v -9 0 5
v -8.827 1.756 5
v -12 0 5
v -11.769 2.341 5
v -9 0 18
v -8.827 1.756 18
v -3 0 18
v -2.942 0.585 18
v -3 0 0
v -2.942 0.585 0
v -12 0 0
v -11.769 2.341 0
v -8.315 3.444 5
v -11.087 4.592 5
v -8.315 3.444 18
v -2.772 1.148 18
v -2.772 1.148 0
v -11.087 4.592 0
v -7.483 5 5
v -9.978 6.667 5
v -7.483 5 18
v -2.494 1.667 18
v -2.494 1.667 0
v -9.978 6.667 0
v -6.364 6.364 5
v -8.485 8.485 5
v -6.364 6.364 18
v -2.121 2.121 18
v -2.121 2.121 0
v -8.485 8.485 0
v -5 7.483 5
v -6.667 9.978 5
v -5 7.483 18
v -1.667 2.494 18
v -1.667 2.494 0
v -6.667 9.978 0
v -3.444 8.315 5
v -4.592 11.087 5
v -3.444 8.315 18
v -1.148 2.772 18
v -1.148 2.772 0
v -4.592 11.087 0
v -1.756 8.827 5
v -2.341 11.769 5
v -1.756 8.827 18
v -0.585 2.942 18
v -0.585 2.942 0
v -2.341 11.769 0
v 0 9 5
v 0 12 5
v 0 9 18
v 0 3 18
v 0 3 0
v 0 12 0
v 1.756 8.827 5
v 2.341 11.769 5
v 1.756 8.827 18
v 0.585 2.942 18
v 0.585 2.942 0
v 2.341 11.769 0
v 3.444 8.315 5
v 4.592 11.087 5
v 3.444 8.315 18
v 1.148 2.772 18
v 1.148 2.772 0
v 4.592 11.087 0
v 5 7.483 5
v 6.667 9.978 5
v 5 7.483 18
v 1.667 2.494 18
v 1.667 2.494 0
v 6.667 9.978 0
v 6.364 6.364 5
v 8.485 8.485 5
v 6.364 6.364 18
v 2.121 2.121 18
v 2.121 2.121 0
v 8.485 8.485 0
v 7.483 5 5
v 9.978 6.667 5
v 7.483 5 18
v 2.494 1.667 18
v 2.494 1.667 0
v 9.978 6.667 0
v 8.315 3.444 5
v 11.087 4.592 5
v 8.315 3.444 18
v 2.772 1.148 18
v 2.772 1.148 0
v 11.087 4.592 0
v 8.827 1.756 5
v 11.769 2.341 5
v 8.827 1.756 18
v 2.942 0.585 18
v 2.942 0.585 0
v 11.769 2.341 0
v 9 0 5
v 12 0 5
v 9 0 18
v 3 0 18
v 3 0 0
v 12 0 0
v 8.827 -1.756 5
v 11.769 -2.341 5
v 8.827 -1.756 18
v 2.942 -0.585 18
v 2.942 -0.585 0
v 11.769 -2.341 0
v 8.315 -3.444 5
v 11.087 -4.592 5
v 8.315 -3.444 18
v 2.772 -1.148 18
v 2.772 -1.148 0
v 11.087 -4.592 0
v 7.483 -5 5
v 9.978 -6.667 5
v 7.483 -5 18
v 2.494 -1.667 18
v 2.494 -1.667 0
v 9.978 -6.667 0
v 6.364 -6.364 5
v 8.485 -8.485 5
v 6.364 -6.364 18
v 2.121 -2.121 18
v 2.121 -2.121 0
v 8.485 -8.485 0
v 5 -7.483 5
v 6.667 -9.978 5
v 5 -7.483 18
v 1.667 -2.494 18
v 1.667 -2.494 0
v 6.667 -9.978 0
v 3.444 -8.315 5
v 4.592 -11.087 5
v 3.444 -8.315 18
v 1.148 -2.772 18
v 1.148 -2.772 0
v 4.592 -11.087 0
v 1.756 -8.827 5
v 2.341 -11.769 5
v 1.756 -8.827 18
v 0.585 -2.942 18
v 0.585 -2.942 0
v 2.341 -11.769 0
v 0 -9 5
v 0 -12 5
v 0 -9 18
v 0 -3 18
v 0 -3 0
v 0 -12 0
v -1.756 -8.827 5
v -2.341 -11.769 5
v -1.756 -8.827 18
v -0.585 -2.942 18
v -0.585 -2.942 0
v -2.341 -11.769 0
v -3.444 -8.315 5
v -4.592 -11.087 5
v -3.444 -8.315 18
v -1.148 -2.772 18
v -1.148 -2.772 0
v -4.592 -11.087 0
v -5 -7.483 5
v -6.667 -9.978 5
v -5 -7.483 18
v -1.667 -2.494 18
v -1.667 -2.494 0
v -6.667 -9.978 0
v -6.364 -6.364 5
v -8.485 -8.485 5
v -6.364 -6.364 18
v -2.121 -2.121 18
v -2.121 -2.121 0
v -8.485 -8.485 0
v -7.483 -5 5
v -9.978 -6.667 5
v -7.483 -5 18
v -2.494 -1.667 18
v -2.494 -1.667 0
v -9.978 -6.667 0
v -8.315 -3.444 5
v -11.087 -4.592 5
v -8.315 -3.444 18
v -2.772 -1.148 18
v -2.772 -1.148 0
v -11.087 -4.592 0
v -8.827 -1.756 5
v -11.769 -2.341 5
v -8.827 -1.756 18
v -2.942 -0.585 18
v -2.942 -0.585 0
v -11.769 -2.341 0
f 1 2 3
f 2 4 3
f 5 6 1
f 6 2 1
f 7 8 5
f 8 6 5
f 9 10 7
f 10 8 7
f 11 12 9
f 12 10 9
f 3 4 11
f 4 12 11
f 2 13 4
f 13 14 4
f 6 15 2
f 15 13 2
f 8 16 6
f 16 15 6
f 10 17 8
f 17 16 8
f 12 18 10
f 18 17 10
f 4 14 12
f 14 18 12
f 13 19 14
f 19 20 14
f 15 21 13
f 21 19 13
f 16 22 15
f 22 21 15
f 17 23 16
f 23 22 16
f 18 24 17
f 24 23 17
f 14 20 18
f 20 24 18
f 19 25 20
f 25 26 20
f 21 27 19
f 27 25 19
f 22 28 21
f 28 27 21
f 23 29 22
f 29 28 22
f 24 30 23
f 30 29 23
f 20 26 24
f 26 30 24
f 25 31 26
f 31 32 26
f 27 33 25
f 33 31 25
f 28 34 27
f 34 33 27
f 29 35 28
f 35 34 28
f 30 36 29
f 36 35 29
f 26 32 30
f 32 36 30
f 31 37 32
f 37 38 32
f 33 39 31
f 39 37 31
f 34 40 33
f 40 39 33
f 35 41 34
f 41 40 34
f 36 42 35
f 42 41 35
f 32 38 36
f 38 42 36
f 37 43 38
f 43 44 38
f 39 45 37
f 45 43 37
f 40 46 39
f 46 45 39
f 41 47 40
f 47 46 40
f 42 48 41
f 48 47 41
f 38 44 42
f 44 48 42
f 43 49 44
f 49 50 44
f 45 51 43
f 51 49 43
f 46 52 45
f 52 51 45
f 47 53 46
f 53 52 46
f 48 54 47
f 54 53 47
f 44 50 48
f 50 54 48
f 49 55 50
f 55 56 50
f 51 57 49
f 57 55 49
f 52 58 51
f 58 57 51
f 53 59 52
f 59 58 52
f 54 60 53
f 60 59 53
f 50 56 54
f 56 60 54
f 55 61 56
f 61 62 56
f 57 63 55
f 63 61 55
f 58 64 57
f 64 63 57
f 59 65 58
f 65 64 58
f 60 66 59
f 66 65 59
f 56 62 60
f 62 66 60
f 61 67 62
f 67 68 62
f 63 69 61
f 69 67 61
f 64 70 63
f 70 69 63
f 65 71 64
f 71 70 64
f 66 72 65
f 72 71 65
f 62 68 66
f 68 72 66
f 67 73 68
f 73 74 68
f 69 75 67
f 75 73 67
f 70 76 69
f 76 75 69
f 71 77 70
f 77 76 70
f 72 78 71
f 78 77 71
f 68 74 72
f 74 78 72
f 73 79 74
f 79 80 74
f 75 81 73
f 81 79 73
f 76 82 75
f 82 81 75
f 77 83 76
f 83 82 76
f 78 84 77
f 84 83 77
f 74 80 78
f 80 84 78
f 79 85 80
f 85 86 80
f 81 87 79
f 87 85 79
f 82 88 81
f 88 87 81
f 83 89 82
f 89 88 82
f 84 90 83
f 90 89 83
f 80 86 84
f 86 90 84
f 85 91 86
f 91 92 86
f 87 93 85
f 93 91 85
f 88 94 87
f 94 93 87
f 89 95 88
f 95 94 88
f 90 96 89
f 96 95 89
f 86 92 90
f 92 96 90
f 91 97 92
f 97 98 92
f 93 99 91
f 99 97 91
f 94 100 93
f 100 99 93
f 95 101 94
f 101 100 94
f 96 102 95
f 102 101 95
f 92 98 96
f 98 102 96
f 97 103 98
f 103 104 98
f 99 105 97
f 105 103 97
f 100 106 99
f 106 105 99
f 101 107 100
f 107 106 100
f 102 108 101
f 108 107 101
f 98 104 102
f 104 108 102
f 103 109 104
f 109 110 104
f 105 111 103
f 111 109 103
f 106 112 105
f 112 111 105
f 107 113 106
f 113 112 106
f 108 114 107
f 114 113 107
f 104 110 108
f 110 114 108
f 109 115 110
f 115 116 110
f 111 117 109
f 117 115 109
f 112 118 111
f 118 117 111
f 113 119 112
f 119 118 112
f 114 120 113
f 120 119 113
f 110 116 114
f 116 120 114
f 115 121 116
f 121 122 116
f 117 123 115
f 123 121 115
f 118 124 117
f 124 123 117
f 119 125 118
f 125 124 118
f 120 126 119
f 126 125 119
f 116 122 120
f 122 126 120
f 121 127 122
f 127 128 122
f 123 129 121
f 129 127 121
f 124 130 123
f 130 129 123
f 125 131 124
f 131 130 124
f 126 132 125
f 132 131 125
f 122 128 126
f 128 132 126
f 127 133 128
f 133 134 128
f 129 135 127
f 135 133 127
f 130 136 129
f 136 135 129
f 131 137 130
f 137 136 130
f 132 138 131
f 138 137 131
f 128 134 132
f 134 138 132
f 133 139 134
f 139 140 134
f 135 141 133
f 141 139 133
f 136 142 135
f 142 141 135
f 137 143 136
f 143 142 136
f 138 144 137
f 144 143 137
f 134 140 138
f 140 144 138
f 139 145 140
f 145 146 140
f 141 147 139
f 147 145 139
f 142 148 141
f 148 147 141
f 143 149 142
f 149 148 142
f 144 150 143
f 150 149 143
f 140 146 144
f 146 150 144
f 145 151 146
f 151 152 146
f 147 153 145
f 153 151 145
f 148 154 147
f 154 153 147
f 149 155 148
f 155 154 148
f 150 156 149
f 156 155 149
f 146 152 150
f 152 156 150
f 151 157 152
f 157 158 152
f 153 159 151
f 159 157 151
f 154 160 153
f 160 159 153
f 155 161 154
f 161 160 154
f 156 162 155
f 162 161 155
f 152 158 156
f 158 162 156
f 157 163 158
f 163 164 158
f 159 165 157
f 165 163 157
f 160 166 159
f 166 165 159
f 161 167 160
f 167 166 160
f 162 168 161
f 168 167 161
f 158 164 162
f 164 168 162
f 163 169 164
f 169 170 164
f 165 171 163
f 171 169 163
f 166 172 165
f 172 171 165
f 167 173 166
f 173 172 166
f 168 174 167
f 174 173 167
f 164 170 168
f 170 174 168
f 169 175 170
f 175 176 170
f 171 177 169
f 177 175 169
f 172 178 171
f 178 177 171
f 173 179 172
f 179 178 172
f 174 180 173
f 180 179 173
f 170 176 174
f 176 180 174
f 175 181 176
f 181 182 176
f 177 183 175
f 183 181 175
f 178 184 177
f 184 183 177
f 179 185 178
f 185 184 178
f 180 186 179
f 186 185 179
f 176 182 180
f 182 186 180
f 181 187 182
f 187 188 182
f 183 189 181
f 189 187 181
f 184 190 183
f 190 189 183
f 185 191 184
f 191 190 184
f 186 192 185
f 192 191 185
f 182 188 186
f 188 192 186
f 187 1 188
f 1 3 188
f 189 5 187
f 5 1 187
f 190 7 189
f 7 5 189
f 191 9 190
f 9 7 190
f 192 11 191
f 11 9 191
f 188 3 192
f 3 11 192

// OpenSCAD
$fn = 32;

// ----------------------------------------------------------------------
// Arc stop: collar, 18 mm thick
// ----------------------------------------------------------------------

// --- parameters (mm) ---
revolve_angle = 360;      // full turn around the Z axis
profile_points = 6;       // points of the closed outline

profile = [[3, 0], [12, 0], [12, 5], [9, 5], [9, 18], [3, 18]];  // single closed polygon, 6 points, counter clockwise

// --- the one profile operation ---
rotate_extrude(angle = revolve_angle) polygon(points = profile);
